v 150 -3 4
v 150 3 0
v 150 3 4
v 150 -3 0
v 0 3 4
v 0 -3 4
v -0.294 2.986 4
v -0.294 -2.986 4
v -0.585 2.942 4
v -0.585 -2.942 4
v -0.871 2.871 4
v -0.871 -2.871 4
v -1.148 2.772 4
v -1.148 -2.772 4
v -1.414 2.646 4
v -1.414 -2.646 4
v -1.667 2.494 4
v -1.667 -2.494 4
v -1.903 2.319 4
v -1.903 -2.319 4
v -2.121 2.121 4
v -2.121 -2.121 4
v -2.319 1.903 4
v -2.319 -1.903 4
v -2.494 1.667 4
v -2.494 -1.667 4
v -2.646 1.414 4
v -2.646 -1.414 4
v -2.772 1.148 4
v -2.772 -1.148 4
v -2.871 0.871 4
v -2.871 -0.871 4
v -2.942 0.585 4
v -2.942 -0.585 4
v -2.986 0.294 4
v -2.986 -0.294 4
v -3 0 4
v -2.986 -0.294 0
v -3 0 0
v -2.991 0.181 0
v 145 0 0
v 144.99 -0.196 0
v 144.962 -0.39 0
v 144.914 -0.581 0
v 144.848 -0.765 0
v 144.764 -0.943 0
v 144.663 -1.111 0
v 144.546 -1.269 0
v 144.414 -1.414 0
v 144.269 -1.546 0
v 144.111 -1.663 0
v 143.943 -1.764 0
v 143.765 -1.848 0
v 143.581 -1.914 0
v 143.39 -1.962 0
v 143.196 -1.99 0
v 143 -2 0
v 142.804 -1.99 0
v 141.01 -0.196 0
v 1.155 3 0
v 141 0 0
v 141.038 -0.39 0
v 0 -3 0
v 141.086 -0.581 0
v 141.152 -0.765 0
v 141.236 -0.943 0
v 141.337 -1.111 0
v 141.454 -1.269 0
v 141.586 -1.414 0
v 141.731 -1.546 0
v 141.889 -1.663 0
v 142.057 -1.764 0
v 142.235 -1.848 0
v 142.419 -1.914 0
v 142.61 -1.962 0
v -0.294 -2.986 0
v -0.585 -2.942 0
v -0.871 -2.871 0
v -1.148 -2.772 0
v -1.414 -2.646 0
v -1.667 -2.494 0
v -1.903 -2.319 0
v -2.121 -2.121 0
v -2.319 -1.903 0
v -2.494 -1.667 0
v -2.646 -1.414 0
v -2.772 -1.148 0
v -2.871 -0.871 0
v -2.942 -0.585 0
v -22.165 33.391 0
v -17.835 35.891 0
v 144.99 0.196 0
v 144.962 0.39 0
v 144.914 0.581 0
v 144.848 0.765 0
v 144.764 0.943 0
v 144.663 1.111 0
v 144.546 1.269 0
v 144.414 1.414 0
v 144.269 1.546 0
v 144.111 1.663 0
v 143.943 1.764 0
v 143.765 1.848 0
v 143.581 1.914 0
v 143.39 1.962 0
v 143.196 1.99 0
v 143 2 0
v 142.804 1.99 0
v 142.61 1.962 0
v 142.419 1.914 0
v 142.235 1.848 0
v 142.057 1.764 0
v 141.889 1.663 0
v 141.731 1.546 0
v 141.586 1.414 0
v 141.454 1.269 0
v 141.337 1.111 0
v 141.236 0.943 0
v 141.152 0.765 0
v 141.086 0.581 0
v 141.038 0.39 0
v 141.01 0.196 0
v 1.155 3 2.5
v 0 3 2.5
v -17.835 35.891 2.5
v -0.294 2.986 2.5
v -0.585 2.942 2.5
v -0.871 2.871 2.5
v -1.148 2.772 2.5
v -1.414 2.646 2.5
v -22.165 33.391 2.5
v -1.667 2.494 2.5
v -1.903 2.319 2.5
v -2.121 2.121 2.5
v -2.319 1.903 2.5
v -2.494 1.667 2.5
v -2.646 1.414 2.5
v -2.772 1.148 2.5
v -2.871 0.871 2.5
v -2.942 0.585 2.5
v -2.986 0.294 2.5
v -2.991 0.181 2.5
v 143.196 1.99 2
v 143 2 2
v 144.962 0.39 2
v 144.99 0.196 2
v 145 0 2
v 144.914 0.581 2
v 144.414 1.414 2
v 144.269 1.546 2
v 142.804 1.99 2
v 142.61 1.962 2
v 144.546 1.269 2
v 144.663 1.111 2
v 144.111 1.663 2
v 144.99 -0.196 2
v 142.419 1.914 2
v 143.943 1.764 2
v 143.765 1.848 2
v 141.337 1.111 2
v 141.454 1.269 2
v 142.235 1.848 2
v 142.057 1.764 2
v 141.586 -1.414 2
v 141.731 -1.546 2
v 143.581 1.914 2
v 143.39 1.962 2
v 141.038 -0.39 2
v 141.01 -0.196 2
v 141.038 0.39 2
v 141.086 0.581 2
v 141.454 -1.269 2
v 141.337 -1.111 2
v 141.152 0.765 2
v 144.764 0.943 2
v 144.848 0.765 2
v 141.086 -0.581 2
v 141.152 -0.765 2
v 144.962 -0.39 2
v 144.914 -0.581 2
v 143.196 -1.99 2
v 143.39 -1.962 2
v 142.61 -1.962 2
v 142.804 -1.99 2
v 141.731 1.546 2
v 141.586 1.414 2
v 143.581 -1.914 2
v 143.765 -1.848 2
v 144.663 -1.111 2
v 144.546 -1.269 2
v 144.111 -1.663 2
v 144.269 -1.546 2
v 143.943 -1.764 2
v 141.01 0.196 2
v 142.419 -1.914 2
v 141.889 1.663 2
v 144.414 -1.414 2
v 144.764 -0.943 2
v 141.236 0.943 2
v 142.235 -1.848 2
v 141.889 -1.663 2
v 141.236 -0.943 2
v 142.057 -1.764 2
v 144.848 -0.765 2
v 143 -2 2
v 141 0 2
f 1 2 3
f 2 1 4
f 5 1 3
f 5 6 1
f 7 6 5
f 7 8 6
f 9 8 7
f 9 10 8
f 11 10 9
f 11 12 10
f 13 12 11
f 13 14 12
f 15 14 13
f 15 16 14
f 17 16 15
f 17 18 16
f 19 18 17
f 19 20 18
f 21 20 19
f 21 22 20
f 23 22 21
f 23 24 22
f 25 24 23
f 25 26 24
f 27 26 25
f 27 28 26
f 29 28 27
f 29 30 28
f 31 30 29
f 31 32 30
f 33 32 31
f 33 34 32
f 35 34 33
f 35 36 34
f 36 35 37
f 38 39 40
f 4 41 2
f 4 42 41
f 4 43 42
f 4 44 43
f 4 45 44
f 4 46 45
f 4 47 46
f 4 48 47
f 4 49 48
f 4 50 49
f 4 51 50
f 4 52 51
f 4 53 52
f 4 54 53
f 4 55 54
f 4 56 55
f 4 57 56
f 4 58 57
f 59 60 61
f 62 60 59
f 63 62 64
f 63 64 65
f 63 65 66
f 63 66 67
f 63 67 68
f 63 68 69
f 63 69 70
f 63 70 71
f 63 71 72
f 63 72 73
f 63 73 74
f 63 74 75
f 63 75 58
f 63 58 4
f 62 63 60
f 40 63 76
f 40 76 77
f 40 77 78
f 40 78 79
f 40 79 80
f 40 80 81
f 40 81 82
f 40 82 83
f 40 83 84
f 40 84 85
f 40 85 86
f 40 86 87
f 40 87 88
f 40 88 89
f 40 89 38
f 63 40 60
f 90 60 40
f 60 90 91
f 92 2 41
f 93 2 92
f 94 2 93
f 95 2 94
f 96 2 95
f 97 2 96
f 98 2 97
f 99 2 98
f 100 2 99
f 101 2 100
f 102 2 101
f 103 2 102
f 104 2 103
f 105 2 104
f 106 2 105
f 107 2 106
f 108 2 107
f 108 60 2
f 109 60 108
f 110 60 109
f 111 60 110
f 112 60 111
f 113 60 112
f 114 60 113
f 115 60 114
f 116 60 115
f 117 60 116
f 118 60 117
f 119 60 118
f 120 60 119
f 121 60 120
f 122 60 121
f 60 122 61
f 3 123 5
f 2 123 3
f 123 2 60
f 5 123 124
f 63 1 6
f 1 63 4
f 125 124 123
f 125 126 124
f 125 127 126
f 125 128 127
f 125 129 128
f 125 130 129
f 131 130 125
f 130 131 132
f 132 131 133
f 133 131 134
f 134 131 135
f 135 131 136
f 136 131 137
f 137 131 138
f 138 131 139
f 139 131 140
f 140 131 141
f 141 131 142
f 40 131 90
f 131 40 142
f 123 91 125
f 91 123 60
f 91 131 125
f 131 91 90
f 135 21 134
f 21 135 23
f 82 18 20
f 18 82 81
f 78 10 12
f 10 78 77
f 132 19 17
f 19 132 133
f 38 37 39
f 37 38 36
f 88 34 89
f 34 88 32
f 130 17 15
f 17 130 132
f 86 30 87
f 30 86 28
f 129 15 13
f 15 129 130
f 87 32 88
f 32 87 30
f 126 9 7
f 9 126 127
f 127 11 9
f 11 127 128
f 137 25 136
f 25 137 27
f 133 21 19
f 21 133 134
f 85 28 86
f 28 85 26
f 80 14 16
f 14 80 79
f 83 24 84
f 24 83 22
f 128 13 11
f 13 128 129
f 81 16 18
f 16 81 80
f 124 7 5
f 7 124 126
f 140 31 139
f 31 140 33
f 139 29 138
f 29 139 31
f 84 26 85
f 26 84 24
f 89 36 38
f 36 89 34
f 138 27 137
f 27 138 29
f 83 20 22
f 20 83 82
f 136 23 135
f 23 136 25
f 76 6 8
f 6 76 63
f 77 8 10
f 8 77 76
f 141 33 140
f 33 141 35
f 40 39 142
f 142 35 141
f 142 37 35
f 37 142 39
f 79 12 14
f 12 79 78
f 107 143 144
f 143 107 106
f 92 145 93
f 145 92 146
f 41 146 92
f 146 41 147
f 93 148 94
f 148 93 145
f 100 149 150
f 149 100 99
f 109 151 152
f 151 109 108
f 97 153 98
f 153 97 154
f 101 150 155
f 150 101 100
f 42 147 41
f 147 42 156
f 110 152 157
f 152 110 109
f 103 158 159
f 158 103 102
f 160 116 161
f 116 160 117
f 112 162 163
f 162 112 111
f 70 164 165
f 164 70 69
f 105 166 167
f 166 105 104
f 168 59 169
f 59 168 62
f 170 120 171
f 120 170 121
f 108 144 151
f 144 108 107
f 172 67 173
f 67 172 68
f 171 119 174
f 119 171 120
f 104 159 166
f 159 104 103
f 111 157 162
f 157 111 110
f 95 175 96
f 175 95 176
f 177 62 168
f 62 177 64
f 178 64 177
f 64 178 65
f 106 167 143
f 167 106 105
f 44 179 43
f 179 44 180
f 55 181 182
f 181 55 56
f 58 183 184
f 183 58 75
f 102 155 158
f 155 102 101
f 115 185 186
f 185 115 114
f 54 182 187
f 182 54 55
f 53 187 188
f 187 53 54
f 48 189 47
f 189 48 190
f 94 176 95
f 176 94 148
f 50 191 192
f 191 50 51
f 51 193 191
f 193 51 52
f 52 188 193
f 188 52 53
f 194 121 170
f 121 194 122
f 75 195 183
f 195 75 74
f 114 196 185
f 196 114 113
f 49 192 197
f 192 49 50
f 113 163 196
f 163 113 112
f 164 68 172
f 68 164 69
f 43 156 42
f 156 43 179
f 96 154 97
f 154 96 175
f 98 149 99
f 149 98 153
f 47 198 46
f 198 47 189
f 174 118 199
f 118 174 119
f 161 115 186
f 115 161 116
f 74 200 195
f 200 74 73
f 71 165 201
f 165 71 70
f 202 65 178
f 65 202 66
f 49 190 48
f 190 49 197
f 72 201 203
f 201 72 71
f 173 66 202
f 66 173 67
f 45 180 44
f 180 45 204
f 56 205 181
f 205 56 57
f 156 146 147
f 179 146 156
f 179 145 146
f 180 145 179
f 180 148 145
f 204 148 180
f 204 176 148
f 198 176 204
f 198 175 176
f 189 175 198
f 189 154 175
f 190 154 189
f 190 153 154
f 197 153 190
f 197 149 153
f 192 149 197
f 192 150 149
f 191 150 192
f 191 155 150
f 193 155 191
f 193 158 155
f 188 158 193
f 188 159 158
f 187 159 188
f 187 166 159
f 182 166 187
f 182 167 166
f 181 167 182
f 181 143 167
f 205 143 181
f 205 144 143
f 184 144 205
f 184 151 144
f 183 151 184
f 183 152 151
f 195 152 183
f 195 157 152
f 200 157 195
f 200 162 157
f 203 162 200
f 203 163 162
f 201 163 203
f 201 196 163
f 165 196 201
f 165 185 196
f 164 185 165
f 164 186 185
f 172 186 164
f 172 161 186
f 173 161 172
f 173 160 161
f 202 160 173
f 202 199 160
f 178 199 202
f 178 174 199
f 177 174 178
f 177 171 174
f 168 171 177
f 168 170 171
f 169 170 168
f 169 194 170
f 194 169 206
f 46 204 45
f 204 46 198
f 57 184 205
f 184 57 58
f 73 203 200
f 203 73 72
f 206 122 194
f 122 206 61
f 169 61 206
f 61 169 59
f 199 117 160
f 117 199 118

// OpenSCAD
// --- Dimensions ---
handle_length = 150;      // Length of the handle bar (mm)
handle_width = 6;         // Width of the handle bar (mm)
handle_thickness = 4;     // Thickness of the handle bar (mm)

foot_length = 40;         // Length of the spreading foot (mm)
foot_width = 5;           // Width of the spreading foot (mm)
foot_thickness = 2.5;     // Thickness of the spreading foot (mm)

boss_diameter = 6;        // Diameter of the joining boss (mm)
boss_height = 4;          // Height of the joining boss (mm)

hole_diameter = 4;        // Diameter of the hanging hole (mm)
hole_x_pos = 143;         // X position of the hole center (mm)

angle_deg = 120;          // Angle of the foot relative to the handle (degrees)

// --- Constants ---
$fn = 64;

// --- Main Model ---
// The part is printed lying flat on the XY plane (Z=0 is the bottom).
// The handle is defined from X=0 to 150.
// The foot centerline starts at the origin and points 120 deg CCW from +X.

difference() {
    // The solid geometry
    union() {
        // 1. The Handle
        // Positioned so X goes from 0 to 150, Y is centered, Z goes from 0 to 4.
        translate([handle_length / 2, 0, handle_thickness / 2])
        cube([handle_length, handle_width, handle_thickness], center = true);

        // 2. The Spreading Foot
        // The centerline starts at the origin. 
        // To ensure it is joined to the handle at the origin, we rotate first.
        // We translate it so the start of the foot is at the origin.
        rotate([0, 0, angle_deg])
        translate([foot_length / 2, 0, foot_thickness / 2])
        cube([foot_length, foot_width, foot_thickness], center = true);

        // 3. The Boss
        // A round boss at the origin. To ensure it is part of the solid 
        // and sits on the bed, we place it at Z=0.
        translate([0, 0, boss_height / 2])
        cylinder(h = boss_height, d = boss_diameter, center = true);
    }

    // 4. The Hanging Hole
    // Through the handle at x = 143, y = 0.
    // We extend the cylinder slightly in Z to ensure a clean cut.
    translate([hole_x_pos, 0, -1])
    cylinder(h = handle_thickness + 2, d = hole_diameter, center = true);
}

// Note on Geometry:
// The user specified the foot centerline starts at the origin.
// The handle is x=0 to 150.
// The boss is at the origin.
// This creates a "hockey stick" shape where the handle and foot meet at the origin.
// To ensure the part is watertight and has no negative Z, we use center=true 
// and translate the center of the objects to their respective half-heights.
